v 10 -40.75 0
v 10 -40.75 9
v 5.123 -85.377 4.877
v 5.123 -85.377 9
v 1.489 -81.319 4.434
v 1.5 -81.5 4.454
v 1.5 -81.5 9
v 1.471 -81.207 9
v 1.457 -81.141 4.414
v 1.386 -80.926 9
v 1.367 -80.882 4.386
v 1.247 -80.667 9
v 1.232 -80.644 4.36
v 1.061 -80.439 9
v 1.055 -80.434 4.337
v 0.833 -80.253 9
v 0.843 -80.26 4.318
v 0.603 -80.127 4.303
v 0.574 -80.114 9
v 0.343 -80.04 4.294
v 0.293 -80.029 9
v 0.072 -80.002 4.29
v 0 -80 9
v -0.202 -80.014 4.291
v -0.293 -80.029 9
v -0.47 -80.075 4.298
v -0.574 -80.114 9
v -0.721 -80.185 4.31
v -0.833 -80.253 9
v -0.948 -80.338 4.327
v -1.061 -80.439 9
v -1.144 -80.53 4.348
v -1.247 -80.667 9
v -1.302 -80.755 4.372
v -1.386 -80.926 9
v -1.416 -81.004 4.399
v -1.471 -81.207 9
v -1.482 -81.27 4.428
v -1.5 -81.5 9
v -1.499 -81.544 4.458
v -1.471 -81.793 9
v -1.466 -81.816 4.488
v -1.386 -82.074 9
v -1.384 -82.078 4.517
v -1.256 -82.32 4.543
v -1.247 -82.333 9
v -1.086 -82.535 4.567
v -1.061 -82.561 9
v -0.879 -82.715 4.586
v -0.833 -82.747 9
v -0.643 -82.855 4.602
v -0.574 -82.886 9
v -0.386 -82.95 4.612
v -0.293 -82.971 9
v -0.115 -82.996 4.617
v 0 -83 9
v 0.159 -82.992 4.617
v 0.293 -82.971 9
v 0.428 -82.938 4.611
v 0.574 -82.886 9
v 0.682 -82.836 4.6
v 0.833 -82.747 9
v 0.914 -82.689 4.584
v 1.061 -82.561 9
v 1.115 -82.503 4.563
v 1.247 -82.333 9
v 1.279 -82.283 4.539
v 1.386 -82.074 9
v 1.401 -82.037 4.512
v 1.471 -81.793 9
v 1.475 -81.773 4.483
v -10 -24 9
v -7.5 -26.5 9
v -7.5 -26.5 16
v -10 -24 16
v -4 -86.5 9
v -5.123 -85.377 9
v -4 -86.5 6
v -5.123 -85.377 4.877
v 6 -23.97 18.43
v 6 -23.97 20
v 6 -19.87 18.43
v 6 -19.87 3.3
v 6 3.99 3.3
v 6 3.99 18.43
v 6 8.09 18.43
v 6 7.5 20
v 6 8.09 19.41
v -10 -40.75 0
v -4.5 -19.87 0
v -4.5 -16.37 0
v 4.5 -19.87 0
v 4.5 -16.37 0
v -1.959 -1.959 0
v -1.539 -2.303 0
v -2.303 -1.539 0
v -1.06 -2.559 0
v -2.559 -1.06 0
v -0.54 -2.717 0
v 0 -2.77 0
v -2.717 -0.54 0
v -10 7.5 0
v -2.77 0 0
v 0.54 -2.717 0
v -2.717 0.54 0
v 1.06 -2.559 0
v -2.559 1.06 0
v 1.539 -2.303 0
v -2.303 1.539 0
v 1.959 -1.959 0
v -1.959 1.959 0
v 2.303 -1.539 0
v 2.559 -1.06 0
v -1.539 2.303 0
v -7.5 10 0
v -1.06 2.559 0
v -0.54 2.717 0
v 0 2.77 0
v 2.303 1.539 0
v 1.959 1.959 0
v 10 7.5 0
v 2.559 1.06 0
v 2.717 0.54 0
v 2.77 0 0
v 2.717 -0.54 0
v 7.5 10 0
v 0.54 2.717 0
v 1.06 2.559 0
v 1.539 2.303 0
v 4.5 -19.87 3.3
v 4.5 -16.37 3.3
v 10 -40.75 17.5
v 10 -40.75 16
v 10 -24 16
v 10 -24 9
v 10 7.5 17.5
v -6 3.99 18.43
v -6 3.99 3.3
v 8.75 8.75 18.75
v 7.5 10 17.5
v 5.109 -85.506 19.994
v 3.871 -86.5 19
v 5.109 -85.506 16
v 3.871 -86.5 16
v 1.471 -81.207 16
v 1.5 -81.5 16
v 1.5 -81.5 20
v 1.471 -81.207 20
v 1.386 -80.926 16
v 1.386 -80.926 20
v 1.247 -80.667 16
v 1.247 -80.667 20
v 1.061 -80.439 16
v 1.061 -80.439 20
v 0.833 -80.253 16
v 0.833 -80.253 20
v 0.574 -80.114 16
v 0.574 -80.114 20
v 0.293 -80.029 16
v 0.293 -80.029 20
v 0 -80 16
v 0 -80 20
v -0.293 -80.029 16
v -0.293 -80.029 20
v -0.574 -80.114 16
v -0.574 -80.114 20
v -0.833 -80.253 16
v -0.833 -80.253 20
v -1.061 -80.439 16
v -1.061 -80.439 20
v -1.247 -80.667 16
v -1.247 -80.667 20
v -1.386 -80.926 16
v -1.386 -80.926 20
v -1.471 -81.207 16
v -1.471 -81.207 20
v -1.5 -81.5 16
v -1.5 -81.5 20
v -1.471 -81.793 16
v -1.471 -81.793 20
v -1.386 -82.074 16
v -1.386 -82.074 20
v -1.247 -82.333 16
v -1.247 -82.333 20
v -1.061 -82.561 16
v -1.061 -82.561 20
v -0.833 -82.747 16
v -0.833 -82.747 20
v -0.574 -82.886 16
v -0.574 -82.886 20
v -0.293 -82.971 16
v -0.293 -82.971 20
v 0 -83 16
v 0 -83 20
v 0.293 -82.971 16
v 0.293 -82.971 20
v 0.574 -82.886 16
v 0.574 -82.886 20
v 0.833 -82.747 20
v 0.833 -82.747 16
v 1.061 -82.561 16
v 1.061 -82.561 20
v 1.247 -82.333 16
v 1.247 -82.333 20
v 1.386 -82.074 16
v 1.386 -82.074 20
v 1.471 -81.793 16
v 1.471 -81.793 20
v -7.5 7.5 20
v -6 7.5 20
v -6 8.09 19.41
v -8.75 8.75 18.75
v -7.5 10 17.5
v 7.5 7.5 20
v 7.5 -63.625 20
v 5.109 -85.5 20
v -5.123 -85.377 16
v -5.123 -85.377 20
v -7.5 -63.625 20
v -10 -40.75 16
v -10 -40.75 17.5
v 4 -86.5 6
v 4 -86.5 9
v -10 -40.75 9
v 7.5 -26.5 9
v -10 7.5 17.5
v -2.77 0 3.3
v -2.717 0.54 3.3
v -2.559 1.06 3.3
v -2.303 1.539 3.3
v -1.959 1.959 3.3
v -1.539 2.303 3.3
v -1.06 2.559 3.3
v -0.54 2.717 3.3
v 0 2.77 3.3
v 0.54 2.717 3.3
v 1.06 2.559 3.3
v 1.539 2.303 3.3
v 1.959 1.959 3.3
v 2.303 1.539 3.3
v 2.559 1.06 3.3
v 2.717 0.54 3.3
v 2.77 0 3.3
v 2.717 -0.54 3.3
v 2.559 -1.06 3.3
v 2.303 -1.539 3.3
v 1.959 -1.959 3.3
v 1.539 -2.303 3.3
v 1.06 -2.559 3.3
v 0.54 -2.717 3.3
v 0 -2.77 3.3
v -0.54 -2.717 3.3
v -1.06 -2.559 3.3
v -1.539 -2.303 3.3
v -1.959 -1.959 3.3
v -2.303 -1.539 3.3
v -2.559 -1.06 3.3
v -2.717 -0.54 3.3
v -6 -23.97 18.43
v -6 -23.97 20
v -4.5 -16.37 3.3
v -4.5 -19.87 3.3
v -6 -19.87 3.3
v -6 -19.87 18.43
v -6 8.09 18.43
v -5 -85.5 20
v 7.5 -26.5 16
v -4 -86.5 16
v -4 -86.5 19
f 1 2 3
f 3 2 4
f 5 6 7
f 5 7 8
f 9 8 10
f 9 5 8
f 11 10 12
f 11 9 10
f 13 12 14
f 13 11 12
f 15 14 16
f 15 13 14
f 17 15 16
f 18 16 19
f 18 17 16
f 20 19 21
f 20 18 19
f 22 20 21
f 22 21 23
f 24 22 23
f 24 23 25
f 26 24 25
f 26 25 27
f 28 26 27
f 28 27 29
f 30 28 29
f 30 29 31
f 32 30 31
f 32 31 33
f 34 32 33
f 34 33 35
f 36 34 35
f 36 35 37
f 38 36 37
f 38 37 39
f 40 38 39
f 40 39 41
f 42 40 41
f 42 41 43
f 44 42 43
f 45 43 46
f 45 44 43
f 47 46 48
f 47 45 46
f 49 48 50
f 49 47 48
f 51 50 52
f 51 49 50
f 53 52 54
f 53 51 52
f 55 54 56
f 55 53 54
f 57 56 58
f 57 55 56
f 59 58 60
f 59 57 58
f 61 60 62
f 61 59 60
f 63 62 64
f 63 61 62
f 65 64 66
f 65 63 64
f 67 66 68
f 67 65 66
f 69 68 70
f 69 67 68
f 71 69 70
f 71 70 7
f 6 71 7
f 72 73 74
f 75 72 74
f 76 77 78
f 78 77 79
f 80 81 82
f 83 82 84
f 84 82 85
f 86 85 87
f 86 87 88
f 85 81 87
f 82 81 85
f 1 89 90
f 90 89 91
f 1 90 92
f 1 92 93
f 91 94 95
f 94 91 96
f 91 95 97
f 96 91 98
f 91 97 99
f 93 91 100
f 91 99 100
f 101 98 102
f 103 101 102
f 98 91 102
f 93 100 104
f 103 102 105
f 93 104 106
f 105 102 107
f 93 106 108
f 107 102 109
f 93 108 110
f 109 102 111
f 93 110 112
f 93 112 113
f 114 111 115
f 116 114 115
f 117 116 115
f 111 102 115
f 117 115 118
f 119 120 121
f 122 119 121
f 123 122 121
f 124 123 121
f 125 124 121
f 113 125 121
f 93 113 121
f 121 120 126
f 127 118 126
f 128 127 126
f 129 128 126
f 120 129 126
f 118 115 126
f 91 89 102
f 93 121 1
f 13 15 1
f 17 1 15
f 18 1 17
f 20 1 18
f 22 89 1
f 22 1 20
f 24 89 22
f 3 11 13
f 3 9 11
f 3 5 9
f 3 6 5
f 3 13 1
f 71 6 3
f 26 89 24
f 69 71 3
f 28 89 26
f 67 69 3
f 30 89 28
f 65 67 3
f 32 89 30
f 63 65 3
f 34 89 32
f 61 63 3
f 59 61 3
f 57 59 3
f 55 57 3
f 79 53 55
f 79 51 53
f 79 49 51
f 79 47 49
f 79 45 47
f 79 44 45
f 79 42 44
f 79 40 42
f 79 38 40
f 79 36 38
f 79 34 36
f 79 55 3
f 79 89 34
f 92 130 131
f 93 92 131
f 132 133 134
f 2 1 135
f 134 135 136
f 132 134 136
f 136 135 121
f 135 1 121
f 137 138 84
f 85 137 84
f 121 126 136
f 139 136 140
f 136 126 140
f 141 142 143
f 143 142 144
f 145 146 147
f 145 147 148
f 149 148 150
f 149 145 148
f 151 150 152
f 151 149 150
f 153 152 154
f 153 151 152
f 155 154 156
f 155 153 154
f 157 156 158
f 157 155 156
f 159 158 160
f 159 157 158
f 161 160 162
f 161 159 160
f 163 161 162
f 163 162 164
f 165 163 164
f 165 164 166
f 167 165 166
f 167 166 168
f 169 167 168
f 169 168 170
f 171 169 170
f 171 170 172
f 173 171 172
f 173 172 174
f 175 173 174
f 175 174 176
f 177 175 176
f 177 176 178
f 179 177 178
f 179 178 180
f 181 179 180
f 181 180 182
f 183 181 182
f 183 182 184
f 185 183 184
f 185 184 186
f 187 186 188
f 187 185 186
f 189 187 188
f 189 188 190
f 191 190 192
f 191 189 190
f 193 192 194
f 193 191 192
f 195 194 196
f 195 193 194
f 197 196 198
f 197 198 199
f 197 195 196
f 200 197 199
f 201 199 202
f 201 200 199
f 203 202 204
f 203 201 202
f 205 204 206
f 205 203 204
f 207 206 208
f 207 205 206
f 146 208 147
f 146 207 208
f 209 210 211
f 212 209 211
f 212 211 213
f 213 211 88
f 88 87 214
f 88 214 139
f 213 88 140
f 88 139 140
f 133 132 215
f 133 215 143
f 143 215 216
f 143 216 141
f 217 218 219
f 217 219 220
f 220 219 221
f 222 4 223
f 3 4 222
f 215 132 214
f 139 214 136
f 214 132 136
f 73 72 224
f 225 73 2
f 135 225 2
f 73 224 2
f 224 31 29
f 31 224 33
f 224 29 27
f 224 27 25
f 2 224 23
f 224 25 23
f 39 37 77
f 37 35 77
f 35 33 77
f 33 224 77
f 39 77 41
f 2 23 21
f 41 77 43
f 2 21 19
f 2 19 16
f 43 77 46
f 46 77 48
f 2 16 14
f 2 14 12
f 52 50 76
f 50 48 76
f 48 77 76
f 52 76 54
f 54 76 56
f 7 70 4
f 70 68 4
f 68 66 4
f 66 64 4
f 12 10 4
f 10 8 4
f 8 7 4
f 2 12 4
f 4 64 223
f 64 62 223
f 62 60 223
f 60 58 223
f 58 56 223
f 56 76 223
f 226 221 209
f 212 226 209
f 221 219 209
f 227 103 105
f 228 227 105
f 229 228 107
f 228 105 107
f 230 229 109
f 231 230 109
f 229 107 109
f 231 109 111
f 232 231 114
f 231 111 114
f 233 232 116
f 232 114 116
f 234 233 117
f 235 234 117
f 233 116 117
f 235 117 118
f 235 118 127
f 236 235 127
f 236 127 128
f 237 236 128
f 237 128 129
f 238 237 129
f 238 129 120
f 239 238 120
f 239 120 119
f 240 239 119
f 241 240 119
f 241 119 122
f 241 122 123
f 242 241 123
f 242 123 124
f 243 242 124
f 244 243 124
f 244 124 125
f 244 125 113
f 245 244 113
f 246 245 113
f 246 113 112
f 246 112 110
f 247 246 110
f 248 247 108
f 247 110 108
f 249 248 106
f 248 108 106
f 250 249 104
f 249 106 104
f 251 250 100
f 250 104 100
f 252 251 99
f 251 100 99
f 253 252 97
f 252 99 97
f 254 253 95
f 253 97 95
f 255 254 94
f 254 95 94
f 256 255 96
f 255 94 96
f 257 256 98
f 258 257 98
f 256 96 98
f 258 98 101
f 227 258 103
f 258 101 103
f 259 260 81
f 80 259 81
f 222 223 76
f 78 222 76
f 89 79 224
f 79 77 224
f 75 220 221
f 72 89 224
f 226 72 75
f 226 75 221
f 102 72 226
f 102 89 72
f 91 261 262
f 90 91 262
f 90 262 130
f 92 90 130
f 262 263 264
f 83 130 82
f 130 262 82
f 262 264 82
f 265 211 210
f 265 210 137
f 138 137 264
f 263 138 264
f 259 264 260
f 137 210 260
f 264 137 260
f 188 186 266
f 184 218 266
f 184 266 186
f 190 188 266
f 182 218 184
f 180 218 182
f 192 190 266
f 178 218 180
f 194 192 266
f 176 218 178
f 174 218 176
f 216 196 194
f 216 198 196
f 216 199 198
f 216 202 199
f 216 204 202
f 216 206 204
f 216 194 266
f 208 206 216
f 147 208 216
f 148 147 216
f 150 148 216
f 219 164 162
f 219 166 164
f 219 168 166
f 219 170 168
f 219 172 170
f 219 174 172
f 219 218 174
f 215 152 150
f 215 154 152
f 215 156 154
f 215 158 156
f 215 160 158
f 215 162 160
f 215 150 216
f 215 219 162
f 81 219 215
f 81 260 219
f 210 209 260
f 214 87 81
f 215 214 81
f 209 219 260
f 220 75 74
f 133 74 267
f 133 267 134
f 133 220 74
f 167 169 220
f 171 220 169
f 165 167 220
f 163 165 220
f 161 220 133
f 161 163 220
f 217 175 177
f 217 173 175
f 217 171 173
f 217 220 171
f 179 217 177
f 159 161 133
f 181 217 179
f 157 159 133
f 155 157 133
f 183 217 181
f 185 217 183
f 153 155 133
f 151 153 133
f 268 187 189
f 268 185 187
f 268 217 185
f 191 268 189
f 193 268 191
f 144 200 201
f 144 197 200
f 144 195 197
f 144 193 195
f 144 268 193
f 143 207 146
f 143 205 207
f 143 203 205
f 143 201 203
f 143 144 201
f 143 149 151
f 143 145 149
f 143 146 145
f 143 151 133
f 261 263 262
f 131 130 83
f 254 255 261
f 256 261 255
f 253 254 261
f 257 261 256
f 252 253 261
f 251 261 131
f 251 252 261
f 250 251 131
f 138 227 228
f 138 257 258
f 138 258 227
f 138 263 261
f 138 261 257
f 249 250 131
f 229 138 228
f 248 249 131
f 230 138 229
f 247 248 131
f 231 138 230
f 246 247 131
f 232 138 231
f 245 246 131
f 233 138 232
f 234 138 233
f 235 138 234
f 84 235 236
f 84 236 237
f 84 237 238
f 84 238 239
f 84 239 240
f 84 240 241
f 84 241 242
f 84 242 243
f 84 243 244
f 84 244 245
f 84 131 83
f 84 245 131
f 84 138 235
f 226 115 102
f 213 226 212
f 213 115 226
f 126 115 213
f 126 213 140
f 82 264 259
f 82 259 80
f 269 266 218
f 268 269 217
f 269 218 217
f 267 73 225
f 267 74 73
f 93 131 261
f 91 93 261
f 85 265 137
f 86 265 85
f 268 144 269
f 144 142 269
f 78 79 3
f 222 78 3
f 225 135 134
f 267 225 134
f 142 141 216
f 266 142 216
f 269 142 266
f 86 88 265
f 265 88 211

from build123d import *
from OCP.BRepFilletAPI import BRepFilletAPI_MakeChamfer

# Parameters (mm, degrees)
SKETCH1_W             = 20
SKETCH1_H             = 81.5
SKETCH1_R             = 1.5
SKETCH1_H_2           = 20
BOSS_EXTRUDE1_DEPTH   = 20
CHAMFER1_SIZE         = 2.5
SKETCH2_W             = 20
SKETCH2_H             = 7
CUT_EXTRUDE1_DEPTH    = 65
CHAMFER2_SIZE         = 2.5
CUT_EXTRUDE2_DEPTH    = 1.57
CHAMFER3_SIZE         = 2.5
SKETCH4_W             = 12
SKETCH4_H             = 23.86
CUT_EXTRUDE3_DEPTH    = 15.13
CUT_EXTRUDE4_DEPTH    = 94.547528027
SKETCH6_R             = 2.77
CUT_EXTRUDE5_DEPTH    = 95.192621792
CUT_EXTRUDE6_DEPTH    = 95.192621792
CHAMFER8_SIZE         = 1
CHAMFER8_SIZE2        = 1.129384369
CUT_EXTRUDE7_DEPTH    = 92.006867873
CHAMFER9_SIZE         = 1
CHAMFER9_SIZE2        = 1.129384369
CHAMFER9_EDGE_2_SIZE  = 1
CHAMFER9_EDGE_2_SIZE2 = 1.129384369
CHAMFER9_EDGE_3_SIZE  = 1
CHAMFER9_EDGE_3_SIZE2 = 1.129384369


with BuildPart() as part:
    # Sketch1 → Boss-Extrude1 (new body)
    # profile 1 of 2: a face of its own
    with BuildSketch(Plane.XY):
        with Locations((0, -50.75)):
            Rectangle(SKETCH1_W, SKETCH1_H)
        with Locations((0, -81.5)):
            Circle(SKETCH1_R, mode=Mode.SUBTRACT)
    # profile 2 of 2: a face of its own
    with BuildSketch(Plane.XY):
        Rectangle(SKETCH1_W, SKETCH1_H_2)
    extrude(amount=BOSS_EXTRUDE1_DEPTH)

    # Chamfer1
    chamfer1_edges = [part.edges().sort_by_distance(p)[0] for p in [
        (0, -91.5, 20),
        (-10, -91.5, 10),
        (-10, 10, 10),
        (10, 10, 10),
        (10, -91.5, 10),
        (10, -40.75, 20),
        (-10, -40.75, 20),
        (0, -91.5, 0),
    ]]
    chamfer(chamfer1_edges, length=CHAMFER1_SIZE)

    # Sketch2 → Cut-Extrude1 (cut)
    with BuildSketch(Plane.XZ.offset(91.5)):
        with Locations((0, 12.5)):
            Rectangle(SKETCH2_W, SKETCH2_H)
    extrude(amount=-CUT_EXTRUDE1_DEPTH, mode=Mode.SUBTRACT)

    # Chamfer2
    chamfer2_edges = [part.edges().sort_by_distance(p)[0] for p in [
        (10, -26.5, 12.5),
        (-10, -26.5, 12.5),
    ]]
    chamfer(chamfer2_edges, length=CHAMFER2_SIZE)

    # Sketch3 → Cut-Extrude2 (cut)
    with BuildSketch(Plane.XY.offset(20)):
        Polygon((0, -19.84), (0, -14), (0, 3.96), (0, 8.09), (-6, 8.09), (-6, -23.97), (0, -23.97), align=None)
        Polygon((0, 3.96), (0, -14), (0, -19.84), (0, -23.97), (6, -23.97), (6, 8.09), (0, 8.09), align=None)
    extrude(amount=-CUT_EXTRUDE2_DEPTH, mode=Mode.SUBTRACT)

    # Chamfer3
    # the kernel refuses this chamfer: 2.5 mm, written as the material it takes off along each edge
    with BuildSketch(Plane(origin=(13.92920747, 10, 20), x_dir=(0, -0.9996219169112968, 0.027495876610586317), z_dir=(-1, 0, 0))) as chamfer3_piece_1:
        Polygon((CHAMFER3_SIZE * 0.999621916911, -CHAMFER3_SIZE * 0.0274958766106), (-CHAMFER3_SIZE * 0.0274958766106, -CHAMFER3_SIZE * 0.999621916911), (0, 0), align=None)
    extrude(amount=27.85841494, mode=Mode.SUBTRACT)

    # Sketch4 → Cut-Extrude3 (cut)
    with BuildSketch(Plane.XY.offset(18.43)):
        with Locations((0, -7.94)):
            Rectangle(SKETCH4_W, SKETCH4_H)
    extrude(amount=-CUT_EXTRUDE3_DEPTH, mode=Mode.SUBTRACT)

    # Sketch5 → Cut-Extrude4 (cut, through all)
    with BuildSketch(Plane.XY.offset(3.3)):
        Polygon((0, -19.87), (4.5, -19.87), (4.5, -16.37), (0, -16.37), (-4.5, -16.37), (-4.5, -19.87), align=None)
    extrude(amount=-CUT_EXTRUDE4_DEPTH, mode=Mode.SUBTRACT)

    # Sketch6 → Cut-Extrude5 (cut, through all)
    with BuildSketch(Plane(origin=(0, 0, 0), x_dir=(-1, 0, 0), z_dir=(0, 0, -1))):
        Circle(SKETCH6_R)
    extrude(amount=-CUT_EXTRUDE5_DEPTH, mode=Mode.SUBTRACT)

    # Sketch7 → Cut-Extrude6 (cut, through all)
    with BuildSketch(Plane.XY.offset(20)):
        Polygon((-5, -86.5), (-7.5, -63.625), (-7.5, -89), (7.5, -89), (7.5, -63.625), (5, -86.5), align=None)
        Polygon((-7.5, -63.625), (-10, -40.75), (-10, -91.5), (10, -91.5), (10, -40.75), (7.5, -63.625), (7.5, -89), (-7.5, -89), align=None)
    extrude(amount=-CUT_EXTRUDE6_DEPTH, mode=Mode.SUBTRACT)

    # Chamfer8: one chamfer whose edges measure the first distance from different faces: ONE call of the kernel's chamfer builder (chamfer() names one face for all edges)
    chamfer8_edges_1 = [part.edges().sort_by_distance(p)[0] for p in [
        (-5, -86.5, 18),
    ]]
    chamfer8_side_1 = [part.faces().sort_by_distance(p)[0] for p in [
        (0, -86.5, 18),
    ]]
    chamfer8_edges_2 = [part.edges().sort_by_distance(p)[0] for p in [
        (0, -86.5, 20),
    ]]
    chamfer8_edges_3 = [part.edges().sort_by_distance(p)[0] for p in [
        (5, -86.5, 18),
    ]]
    chamfer8_side_3 = [part.faces().sort_by_distance(p)[0] for p in [
        (7.191358025, -66.449074074, 17.783950617),
    ]]
    chamfer8 = BRepFilletAPI_MakeChamfer(part.part.solid().wrapped)
    for e in chamfer8_edges_1:
        chamfer8.Add(CHAMFER8_SIZE, CHAMFER8_SIZE2, e.wrapped, chamfer8_side_1[0].wrapped)  # the first distance lies on this face
    for e in chamfer8_edges_2:
        chamfer8.Add(CHAMFER8_SIZE, e.wrapped)
    for e in chamfer8_edges_3:
        chamfer8.Add(CHAMFER8_SIZE, CHAMFER8_SIZE2, e.wrapped, chamfer8_side_3[0].wrapped)  # the first distance lies on this face
    add(Compound.cast(chamfer8.Shape()), mode=Mode.REPLACE)

    # Sketch8 → Cut-Extrude7 (cut, through all)
    with BuildSketch(Plane.ZY.offset(10)):
        Polygon((0, -40.75), (5, -86.5), (0, -86.5), align=None)
    extrude(amount=-CUT_EXTRUDE7_DEPTH, mode=Mode.SUBTRACT)

    # Chamfer9
    chamfer9_edges = [part.edges().sort_by_distance(p)[0] for p in [
        (-5, -86.5, 7),
    ]]
    chamfer9_side = [part.faces().sort_by_distance(p)[0] for p in [
        (0, -86.5, 7),
    ]]
    chamfer(chamfer9_edges, length=CHAMFER9_SIZE, length2=CHAMFER9_SIZE2, reference=chamfer9_side[0])

    # Chamfer9 edge 2
    chamfer9_edge_2_edges = [part.edges().sort_by_distance(p)[0] for p in [
        (5, -86.5, 7),
    ]]
    chamfer9_edge_2_side = [part.faces().sort_by_distance(p)[0] for p in [
        (0, -86.5, 7),
    ]]
    chamfer(chamfer9_edge_2_edges, length=CHAMFER9_EDGE_2_SIZE, length2=CHAMFER9_EDGE_2_SIZE2, reference=chamfer9_edge_2_side[0])

    # Chamfer9 edge 3
    chamfer9_edge_3_edges = [part.edges().sort_by_distance(p)[0] for p in [
        (0, -86.5, 5),
    ]]
    chamfer9_edge_3_side = [part.faces().sort_by_distance(p)[0] for p in [
        (0, -86.5, 7),
    ]]
    chamfer(chamfer9_edge_3_edges, length=CHAMFER9_EDGE_3_SIZE, length2=CHAMFER9_EDGE_3_SIZE2, reference=chamfer9_edge_3_side[0])


solid = part.part
